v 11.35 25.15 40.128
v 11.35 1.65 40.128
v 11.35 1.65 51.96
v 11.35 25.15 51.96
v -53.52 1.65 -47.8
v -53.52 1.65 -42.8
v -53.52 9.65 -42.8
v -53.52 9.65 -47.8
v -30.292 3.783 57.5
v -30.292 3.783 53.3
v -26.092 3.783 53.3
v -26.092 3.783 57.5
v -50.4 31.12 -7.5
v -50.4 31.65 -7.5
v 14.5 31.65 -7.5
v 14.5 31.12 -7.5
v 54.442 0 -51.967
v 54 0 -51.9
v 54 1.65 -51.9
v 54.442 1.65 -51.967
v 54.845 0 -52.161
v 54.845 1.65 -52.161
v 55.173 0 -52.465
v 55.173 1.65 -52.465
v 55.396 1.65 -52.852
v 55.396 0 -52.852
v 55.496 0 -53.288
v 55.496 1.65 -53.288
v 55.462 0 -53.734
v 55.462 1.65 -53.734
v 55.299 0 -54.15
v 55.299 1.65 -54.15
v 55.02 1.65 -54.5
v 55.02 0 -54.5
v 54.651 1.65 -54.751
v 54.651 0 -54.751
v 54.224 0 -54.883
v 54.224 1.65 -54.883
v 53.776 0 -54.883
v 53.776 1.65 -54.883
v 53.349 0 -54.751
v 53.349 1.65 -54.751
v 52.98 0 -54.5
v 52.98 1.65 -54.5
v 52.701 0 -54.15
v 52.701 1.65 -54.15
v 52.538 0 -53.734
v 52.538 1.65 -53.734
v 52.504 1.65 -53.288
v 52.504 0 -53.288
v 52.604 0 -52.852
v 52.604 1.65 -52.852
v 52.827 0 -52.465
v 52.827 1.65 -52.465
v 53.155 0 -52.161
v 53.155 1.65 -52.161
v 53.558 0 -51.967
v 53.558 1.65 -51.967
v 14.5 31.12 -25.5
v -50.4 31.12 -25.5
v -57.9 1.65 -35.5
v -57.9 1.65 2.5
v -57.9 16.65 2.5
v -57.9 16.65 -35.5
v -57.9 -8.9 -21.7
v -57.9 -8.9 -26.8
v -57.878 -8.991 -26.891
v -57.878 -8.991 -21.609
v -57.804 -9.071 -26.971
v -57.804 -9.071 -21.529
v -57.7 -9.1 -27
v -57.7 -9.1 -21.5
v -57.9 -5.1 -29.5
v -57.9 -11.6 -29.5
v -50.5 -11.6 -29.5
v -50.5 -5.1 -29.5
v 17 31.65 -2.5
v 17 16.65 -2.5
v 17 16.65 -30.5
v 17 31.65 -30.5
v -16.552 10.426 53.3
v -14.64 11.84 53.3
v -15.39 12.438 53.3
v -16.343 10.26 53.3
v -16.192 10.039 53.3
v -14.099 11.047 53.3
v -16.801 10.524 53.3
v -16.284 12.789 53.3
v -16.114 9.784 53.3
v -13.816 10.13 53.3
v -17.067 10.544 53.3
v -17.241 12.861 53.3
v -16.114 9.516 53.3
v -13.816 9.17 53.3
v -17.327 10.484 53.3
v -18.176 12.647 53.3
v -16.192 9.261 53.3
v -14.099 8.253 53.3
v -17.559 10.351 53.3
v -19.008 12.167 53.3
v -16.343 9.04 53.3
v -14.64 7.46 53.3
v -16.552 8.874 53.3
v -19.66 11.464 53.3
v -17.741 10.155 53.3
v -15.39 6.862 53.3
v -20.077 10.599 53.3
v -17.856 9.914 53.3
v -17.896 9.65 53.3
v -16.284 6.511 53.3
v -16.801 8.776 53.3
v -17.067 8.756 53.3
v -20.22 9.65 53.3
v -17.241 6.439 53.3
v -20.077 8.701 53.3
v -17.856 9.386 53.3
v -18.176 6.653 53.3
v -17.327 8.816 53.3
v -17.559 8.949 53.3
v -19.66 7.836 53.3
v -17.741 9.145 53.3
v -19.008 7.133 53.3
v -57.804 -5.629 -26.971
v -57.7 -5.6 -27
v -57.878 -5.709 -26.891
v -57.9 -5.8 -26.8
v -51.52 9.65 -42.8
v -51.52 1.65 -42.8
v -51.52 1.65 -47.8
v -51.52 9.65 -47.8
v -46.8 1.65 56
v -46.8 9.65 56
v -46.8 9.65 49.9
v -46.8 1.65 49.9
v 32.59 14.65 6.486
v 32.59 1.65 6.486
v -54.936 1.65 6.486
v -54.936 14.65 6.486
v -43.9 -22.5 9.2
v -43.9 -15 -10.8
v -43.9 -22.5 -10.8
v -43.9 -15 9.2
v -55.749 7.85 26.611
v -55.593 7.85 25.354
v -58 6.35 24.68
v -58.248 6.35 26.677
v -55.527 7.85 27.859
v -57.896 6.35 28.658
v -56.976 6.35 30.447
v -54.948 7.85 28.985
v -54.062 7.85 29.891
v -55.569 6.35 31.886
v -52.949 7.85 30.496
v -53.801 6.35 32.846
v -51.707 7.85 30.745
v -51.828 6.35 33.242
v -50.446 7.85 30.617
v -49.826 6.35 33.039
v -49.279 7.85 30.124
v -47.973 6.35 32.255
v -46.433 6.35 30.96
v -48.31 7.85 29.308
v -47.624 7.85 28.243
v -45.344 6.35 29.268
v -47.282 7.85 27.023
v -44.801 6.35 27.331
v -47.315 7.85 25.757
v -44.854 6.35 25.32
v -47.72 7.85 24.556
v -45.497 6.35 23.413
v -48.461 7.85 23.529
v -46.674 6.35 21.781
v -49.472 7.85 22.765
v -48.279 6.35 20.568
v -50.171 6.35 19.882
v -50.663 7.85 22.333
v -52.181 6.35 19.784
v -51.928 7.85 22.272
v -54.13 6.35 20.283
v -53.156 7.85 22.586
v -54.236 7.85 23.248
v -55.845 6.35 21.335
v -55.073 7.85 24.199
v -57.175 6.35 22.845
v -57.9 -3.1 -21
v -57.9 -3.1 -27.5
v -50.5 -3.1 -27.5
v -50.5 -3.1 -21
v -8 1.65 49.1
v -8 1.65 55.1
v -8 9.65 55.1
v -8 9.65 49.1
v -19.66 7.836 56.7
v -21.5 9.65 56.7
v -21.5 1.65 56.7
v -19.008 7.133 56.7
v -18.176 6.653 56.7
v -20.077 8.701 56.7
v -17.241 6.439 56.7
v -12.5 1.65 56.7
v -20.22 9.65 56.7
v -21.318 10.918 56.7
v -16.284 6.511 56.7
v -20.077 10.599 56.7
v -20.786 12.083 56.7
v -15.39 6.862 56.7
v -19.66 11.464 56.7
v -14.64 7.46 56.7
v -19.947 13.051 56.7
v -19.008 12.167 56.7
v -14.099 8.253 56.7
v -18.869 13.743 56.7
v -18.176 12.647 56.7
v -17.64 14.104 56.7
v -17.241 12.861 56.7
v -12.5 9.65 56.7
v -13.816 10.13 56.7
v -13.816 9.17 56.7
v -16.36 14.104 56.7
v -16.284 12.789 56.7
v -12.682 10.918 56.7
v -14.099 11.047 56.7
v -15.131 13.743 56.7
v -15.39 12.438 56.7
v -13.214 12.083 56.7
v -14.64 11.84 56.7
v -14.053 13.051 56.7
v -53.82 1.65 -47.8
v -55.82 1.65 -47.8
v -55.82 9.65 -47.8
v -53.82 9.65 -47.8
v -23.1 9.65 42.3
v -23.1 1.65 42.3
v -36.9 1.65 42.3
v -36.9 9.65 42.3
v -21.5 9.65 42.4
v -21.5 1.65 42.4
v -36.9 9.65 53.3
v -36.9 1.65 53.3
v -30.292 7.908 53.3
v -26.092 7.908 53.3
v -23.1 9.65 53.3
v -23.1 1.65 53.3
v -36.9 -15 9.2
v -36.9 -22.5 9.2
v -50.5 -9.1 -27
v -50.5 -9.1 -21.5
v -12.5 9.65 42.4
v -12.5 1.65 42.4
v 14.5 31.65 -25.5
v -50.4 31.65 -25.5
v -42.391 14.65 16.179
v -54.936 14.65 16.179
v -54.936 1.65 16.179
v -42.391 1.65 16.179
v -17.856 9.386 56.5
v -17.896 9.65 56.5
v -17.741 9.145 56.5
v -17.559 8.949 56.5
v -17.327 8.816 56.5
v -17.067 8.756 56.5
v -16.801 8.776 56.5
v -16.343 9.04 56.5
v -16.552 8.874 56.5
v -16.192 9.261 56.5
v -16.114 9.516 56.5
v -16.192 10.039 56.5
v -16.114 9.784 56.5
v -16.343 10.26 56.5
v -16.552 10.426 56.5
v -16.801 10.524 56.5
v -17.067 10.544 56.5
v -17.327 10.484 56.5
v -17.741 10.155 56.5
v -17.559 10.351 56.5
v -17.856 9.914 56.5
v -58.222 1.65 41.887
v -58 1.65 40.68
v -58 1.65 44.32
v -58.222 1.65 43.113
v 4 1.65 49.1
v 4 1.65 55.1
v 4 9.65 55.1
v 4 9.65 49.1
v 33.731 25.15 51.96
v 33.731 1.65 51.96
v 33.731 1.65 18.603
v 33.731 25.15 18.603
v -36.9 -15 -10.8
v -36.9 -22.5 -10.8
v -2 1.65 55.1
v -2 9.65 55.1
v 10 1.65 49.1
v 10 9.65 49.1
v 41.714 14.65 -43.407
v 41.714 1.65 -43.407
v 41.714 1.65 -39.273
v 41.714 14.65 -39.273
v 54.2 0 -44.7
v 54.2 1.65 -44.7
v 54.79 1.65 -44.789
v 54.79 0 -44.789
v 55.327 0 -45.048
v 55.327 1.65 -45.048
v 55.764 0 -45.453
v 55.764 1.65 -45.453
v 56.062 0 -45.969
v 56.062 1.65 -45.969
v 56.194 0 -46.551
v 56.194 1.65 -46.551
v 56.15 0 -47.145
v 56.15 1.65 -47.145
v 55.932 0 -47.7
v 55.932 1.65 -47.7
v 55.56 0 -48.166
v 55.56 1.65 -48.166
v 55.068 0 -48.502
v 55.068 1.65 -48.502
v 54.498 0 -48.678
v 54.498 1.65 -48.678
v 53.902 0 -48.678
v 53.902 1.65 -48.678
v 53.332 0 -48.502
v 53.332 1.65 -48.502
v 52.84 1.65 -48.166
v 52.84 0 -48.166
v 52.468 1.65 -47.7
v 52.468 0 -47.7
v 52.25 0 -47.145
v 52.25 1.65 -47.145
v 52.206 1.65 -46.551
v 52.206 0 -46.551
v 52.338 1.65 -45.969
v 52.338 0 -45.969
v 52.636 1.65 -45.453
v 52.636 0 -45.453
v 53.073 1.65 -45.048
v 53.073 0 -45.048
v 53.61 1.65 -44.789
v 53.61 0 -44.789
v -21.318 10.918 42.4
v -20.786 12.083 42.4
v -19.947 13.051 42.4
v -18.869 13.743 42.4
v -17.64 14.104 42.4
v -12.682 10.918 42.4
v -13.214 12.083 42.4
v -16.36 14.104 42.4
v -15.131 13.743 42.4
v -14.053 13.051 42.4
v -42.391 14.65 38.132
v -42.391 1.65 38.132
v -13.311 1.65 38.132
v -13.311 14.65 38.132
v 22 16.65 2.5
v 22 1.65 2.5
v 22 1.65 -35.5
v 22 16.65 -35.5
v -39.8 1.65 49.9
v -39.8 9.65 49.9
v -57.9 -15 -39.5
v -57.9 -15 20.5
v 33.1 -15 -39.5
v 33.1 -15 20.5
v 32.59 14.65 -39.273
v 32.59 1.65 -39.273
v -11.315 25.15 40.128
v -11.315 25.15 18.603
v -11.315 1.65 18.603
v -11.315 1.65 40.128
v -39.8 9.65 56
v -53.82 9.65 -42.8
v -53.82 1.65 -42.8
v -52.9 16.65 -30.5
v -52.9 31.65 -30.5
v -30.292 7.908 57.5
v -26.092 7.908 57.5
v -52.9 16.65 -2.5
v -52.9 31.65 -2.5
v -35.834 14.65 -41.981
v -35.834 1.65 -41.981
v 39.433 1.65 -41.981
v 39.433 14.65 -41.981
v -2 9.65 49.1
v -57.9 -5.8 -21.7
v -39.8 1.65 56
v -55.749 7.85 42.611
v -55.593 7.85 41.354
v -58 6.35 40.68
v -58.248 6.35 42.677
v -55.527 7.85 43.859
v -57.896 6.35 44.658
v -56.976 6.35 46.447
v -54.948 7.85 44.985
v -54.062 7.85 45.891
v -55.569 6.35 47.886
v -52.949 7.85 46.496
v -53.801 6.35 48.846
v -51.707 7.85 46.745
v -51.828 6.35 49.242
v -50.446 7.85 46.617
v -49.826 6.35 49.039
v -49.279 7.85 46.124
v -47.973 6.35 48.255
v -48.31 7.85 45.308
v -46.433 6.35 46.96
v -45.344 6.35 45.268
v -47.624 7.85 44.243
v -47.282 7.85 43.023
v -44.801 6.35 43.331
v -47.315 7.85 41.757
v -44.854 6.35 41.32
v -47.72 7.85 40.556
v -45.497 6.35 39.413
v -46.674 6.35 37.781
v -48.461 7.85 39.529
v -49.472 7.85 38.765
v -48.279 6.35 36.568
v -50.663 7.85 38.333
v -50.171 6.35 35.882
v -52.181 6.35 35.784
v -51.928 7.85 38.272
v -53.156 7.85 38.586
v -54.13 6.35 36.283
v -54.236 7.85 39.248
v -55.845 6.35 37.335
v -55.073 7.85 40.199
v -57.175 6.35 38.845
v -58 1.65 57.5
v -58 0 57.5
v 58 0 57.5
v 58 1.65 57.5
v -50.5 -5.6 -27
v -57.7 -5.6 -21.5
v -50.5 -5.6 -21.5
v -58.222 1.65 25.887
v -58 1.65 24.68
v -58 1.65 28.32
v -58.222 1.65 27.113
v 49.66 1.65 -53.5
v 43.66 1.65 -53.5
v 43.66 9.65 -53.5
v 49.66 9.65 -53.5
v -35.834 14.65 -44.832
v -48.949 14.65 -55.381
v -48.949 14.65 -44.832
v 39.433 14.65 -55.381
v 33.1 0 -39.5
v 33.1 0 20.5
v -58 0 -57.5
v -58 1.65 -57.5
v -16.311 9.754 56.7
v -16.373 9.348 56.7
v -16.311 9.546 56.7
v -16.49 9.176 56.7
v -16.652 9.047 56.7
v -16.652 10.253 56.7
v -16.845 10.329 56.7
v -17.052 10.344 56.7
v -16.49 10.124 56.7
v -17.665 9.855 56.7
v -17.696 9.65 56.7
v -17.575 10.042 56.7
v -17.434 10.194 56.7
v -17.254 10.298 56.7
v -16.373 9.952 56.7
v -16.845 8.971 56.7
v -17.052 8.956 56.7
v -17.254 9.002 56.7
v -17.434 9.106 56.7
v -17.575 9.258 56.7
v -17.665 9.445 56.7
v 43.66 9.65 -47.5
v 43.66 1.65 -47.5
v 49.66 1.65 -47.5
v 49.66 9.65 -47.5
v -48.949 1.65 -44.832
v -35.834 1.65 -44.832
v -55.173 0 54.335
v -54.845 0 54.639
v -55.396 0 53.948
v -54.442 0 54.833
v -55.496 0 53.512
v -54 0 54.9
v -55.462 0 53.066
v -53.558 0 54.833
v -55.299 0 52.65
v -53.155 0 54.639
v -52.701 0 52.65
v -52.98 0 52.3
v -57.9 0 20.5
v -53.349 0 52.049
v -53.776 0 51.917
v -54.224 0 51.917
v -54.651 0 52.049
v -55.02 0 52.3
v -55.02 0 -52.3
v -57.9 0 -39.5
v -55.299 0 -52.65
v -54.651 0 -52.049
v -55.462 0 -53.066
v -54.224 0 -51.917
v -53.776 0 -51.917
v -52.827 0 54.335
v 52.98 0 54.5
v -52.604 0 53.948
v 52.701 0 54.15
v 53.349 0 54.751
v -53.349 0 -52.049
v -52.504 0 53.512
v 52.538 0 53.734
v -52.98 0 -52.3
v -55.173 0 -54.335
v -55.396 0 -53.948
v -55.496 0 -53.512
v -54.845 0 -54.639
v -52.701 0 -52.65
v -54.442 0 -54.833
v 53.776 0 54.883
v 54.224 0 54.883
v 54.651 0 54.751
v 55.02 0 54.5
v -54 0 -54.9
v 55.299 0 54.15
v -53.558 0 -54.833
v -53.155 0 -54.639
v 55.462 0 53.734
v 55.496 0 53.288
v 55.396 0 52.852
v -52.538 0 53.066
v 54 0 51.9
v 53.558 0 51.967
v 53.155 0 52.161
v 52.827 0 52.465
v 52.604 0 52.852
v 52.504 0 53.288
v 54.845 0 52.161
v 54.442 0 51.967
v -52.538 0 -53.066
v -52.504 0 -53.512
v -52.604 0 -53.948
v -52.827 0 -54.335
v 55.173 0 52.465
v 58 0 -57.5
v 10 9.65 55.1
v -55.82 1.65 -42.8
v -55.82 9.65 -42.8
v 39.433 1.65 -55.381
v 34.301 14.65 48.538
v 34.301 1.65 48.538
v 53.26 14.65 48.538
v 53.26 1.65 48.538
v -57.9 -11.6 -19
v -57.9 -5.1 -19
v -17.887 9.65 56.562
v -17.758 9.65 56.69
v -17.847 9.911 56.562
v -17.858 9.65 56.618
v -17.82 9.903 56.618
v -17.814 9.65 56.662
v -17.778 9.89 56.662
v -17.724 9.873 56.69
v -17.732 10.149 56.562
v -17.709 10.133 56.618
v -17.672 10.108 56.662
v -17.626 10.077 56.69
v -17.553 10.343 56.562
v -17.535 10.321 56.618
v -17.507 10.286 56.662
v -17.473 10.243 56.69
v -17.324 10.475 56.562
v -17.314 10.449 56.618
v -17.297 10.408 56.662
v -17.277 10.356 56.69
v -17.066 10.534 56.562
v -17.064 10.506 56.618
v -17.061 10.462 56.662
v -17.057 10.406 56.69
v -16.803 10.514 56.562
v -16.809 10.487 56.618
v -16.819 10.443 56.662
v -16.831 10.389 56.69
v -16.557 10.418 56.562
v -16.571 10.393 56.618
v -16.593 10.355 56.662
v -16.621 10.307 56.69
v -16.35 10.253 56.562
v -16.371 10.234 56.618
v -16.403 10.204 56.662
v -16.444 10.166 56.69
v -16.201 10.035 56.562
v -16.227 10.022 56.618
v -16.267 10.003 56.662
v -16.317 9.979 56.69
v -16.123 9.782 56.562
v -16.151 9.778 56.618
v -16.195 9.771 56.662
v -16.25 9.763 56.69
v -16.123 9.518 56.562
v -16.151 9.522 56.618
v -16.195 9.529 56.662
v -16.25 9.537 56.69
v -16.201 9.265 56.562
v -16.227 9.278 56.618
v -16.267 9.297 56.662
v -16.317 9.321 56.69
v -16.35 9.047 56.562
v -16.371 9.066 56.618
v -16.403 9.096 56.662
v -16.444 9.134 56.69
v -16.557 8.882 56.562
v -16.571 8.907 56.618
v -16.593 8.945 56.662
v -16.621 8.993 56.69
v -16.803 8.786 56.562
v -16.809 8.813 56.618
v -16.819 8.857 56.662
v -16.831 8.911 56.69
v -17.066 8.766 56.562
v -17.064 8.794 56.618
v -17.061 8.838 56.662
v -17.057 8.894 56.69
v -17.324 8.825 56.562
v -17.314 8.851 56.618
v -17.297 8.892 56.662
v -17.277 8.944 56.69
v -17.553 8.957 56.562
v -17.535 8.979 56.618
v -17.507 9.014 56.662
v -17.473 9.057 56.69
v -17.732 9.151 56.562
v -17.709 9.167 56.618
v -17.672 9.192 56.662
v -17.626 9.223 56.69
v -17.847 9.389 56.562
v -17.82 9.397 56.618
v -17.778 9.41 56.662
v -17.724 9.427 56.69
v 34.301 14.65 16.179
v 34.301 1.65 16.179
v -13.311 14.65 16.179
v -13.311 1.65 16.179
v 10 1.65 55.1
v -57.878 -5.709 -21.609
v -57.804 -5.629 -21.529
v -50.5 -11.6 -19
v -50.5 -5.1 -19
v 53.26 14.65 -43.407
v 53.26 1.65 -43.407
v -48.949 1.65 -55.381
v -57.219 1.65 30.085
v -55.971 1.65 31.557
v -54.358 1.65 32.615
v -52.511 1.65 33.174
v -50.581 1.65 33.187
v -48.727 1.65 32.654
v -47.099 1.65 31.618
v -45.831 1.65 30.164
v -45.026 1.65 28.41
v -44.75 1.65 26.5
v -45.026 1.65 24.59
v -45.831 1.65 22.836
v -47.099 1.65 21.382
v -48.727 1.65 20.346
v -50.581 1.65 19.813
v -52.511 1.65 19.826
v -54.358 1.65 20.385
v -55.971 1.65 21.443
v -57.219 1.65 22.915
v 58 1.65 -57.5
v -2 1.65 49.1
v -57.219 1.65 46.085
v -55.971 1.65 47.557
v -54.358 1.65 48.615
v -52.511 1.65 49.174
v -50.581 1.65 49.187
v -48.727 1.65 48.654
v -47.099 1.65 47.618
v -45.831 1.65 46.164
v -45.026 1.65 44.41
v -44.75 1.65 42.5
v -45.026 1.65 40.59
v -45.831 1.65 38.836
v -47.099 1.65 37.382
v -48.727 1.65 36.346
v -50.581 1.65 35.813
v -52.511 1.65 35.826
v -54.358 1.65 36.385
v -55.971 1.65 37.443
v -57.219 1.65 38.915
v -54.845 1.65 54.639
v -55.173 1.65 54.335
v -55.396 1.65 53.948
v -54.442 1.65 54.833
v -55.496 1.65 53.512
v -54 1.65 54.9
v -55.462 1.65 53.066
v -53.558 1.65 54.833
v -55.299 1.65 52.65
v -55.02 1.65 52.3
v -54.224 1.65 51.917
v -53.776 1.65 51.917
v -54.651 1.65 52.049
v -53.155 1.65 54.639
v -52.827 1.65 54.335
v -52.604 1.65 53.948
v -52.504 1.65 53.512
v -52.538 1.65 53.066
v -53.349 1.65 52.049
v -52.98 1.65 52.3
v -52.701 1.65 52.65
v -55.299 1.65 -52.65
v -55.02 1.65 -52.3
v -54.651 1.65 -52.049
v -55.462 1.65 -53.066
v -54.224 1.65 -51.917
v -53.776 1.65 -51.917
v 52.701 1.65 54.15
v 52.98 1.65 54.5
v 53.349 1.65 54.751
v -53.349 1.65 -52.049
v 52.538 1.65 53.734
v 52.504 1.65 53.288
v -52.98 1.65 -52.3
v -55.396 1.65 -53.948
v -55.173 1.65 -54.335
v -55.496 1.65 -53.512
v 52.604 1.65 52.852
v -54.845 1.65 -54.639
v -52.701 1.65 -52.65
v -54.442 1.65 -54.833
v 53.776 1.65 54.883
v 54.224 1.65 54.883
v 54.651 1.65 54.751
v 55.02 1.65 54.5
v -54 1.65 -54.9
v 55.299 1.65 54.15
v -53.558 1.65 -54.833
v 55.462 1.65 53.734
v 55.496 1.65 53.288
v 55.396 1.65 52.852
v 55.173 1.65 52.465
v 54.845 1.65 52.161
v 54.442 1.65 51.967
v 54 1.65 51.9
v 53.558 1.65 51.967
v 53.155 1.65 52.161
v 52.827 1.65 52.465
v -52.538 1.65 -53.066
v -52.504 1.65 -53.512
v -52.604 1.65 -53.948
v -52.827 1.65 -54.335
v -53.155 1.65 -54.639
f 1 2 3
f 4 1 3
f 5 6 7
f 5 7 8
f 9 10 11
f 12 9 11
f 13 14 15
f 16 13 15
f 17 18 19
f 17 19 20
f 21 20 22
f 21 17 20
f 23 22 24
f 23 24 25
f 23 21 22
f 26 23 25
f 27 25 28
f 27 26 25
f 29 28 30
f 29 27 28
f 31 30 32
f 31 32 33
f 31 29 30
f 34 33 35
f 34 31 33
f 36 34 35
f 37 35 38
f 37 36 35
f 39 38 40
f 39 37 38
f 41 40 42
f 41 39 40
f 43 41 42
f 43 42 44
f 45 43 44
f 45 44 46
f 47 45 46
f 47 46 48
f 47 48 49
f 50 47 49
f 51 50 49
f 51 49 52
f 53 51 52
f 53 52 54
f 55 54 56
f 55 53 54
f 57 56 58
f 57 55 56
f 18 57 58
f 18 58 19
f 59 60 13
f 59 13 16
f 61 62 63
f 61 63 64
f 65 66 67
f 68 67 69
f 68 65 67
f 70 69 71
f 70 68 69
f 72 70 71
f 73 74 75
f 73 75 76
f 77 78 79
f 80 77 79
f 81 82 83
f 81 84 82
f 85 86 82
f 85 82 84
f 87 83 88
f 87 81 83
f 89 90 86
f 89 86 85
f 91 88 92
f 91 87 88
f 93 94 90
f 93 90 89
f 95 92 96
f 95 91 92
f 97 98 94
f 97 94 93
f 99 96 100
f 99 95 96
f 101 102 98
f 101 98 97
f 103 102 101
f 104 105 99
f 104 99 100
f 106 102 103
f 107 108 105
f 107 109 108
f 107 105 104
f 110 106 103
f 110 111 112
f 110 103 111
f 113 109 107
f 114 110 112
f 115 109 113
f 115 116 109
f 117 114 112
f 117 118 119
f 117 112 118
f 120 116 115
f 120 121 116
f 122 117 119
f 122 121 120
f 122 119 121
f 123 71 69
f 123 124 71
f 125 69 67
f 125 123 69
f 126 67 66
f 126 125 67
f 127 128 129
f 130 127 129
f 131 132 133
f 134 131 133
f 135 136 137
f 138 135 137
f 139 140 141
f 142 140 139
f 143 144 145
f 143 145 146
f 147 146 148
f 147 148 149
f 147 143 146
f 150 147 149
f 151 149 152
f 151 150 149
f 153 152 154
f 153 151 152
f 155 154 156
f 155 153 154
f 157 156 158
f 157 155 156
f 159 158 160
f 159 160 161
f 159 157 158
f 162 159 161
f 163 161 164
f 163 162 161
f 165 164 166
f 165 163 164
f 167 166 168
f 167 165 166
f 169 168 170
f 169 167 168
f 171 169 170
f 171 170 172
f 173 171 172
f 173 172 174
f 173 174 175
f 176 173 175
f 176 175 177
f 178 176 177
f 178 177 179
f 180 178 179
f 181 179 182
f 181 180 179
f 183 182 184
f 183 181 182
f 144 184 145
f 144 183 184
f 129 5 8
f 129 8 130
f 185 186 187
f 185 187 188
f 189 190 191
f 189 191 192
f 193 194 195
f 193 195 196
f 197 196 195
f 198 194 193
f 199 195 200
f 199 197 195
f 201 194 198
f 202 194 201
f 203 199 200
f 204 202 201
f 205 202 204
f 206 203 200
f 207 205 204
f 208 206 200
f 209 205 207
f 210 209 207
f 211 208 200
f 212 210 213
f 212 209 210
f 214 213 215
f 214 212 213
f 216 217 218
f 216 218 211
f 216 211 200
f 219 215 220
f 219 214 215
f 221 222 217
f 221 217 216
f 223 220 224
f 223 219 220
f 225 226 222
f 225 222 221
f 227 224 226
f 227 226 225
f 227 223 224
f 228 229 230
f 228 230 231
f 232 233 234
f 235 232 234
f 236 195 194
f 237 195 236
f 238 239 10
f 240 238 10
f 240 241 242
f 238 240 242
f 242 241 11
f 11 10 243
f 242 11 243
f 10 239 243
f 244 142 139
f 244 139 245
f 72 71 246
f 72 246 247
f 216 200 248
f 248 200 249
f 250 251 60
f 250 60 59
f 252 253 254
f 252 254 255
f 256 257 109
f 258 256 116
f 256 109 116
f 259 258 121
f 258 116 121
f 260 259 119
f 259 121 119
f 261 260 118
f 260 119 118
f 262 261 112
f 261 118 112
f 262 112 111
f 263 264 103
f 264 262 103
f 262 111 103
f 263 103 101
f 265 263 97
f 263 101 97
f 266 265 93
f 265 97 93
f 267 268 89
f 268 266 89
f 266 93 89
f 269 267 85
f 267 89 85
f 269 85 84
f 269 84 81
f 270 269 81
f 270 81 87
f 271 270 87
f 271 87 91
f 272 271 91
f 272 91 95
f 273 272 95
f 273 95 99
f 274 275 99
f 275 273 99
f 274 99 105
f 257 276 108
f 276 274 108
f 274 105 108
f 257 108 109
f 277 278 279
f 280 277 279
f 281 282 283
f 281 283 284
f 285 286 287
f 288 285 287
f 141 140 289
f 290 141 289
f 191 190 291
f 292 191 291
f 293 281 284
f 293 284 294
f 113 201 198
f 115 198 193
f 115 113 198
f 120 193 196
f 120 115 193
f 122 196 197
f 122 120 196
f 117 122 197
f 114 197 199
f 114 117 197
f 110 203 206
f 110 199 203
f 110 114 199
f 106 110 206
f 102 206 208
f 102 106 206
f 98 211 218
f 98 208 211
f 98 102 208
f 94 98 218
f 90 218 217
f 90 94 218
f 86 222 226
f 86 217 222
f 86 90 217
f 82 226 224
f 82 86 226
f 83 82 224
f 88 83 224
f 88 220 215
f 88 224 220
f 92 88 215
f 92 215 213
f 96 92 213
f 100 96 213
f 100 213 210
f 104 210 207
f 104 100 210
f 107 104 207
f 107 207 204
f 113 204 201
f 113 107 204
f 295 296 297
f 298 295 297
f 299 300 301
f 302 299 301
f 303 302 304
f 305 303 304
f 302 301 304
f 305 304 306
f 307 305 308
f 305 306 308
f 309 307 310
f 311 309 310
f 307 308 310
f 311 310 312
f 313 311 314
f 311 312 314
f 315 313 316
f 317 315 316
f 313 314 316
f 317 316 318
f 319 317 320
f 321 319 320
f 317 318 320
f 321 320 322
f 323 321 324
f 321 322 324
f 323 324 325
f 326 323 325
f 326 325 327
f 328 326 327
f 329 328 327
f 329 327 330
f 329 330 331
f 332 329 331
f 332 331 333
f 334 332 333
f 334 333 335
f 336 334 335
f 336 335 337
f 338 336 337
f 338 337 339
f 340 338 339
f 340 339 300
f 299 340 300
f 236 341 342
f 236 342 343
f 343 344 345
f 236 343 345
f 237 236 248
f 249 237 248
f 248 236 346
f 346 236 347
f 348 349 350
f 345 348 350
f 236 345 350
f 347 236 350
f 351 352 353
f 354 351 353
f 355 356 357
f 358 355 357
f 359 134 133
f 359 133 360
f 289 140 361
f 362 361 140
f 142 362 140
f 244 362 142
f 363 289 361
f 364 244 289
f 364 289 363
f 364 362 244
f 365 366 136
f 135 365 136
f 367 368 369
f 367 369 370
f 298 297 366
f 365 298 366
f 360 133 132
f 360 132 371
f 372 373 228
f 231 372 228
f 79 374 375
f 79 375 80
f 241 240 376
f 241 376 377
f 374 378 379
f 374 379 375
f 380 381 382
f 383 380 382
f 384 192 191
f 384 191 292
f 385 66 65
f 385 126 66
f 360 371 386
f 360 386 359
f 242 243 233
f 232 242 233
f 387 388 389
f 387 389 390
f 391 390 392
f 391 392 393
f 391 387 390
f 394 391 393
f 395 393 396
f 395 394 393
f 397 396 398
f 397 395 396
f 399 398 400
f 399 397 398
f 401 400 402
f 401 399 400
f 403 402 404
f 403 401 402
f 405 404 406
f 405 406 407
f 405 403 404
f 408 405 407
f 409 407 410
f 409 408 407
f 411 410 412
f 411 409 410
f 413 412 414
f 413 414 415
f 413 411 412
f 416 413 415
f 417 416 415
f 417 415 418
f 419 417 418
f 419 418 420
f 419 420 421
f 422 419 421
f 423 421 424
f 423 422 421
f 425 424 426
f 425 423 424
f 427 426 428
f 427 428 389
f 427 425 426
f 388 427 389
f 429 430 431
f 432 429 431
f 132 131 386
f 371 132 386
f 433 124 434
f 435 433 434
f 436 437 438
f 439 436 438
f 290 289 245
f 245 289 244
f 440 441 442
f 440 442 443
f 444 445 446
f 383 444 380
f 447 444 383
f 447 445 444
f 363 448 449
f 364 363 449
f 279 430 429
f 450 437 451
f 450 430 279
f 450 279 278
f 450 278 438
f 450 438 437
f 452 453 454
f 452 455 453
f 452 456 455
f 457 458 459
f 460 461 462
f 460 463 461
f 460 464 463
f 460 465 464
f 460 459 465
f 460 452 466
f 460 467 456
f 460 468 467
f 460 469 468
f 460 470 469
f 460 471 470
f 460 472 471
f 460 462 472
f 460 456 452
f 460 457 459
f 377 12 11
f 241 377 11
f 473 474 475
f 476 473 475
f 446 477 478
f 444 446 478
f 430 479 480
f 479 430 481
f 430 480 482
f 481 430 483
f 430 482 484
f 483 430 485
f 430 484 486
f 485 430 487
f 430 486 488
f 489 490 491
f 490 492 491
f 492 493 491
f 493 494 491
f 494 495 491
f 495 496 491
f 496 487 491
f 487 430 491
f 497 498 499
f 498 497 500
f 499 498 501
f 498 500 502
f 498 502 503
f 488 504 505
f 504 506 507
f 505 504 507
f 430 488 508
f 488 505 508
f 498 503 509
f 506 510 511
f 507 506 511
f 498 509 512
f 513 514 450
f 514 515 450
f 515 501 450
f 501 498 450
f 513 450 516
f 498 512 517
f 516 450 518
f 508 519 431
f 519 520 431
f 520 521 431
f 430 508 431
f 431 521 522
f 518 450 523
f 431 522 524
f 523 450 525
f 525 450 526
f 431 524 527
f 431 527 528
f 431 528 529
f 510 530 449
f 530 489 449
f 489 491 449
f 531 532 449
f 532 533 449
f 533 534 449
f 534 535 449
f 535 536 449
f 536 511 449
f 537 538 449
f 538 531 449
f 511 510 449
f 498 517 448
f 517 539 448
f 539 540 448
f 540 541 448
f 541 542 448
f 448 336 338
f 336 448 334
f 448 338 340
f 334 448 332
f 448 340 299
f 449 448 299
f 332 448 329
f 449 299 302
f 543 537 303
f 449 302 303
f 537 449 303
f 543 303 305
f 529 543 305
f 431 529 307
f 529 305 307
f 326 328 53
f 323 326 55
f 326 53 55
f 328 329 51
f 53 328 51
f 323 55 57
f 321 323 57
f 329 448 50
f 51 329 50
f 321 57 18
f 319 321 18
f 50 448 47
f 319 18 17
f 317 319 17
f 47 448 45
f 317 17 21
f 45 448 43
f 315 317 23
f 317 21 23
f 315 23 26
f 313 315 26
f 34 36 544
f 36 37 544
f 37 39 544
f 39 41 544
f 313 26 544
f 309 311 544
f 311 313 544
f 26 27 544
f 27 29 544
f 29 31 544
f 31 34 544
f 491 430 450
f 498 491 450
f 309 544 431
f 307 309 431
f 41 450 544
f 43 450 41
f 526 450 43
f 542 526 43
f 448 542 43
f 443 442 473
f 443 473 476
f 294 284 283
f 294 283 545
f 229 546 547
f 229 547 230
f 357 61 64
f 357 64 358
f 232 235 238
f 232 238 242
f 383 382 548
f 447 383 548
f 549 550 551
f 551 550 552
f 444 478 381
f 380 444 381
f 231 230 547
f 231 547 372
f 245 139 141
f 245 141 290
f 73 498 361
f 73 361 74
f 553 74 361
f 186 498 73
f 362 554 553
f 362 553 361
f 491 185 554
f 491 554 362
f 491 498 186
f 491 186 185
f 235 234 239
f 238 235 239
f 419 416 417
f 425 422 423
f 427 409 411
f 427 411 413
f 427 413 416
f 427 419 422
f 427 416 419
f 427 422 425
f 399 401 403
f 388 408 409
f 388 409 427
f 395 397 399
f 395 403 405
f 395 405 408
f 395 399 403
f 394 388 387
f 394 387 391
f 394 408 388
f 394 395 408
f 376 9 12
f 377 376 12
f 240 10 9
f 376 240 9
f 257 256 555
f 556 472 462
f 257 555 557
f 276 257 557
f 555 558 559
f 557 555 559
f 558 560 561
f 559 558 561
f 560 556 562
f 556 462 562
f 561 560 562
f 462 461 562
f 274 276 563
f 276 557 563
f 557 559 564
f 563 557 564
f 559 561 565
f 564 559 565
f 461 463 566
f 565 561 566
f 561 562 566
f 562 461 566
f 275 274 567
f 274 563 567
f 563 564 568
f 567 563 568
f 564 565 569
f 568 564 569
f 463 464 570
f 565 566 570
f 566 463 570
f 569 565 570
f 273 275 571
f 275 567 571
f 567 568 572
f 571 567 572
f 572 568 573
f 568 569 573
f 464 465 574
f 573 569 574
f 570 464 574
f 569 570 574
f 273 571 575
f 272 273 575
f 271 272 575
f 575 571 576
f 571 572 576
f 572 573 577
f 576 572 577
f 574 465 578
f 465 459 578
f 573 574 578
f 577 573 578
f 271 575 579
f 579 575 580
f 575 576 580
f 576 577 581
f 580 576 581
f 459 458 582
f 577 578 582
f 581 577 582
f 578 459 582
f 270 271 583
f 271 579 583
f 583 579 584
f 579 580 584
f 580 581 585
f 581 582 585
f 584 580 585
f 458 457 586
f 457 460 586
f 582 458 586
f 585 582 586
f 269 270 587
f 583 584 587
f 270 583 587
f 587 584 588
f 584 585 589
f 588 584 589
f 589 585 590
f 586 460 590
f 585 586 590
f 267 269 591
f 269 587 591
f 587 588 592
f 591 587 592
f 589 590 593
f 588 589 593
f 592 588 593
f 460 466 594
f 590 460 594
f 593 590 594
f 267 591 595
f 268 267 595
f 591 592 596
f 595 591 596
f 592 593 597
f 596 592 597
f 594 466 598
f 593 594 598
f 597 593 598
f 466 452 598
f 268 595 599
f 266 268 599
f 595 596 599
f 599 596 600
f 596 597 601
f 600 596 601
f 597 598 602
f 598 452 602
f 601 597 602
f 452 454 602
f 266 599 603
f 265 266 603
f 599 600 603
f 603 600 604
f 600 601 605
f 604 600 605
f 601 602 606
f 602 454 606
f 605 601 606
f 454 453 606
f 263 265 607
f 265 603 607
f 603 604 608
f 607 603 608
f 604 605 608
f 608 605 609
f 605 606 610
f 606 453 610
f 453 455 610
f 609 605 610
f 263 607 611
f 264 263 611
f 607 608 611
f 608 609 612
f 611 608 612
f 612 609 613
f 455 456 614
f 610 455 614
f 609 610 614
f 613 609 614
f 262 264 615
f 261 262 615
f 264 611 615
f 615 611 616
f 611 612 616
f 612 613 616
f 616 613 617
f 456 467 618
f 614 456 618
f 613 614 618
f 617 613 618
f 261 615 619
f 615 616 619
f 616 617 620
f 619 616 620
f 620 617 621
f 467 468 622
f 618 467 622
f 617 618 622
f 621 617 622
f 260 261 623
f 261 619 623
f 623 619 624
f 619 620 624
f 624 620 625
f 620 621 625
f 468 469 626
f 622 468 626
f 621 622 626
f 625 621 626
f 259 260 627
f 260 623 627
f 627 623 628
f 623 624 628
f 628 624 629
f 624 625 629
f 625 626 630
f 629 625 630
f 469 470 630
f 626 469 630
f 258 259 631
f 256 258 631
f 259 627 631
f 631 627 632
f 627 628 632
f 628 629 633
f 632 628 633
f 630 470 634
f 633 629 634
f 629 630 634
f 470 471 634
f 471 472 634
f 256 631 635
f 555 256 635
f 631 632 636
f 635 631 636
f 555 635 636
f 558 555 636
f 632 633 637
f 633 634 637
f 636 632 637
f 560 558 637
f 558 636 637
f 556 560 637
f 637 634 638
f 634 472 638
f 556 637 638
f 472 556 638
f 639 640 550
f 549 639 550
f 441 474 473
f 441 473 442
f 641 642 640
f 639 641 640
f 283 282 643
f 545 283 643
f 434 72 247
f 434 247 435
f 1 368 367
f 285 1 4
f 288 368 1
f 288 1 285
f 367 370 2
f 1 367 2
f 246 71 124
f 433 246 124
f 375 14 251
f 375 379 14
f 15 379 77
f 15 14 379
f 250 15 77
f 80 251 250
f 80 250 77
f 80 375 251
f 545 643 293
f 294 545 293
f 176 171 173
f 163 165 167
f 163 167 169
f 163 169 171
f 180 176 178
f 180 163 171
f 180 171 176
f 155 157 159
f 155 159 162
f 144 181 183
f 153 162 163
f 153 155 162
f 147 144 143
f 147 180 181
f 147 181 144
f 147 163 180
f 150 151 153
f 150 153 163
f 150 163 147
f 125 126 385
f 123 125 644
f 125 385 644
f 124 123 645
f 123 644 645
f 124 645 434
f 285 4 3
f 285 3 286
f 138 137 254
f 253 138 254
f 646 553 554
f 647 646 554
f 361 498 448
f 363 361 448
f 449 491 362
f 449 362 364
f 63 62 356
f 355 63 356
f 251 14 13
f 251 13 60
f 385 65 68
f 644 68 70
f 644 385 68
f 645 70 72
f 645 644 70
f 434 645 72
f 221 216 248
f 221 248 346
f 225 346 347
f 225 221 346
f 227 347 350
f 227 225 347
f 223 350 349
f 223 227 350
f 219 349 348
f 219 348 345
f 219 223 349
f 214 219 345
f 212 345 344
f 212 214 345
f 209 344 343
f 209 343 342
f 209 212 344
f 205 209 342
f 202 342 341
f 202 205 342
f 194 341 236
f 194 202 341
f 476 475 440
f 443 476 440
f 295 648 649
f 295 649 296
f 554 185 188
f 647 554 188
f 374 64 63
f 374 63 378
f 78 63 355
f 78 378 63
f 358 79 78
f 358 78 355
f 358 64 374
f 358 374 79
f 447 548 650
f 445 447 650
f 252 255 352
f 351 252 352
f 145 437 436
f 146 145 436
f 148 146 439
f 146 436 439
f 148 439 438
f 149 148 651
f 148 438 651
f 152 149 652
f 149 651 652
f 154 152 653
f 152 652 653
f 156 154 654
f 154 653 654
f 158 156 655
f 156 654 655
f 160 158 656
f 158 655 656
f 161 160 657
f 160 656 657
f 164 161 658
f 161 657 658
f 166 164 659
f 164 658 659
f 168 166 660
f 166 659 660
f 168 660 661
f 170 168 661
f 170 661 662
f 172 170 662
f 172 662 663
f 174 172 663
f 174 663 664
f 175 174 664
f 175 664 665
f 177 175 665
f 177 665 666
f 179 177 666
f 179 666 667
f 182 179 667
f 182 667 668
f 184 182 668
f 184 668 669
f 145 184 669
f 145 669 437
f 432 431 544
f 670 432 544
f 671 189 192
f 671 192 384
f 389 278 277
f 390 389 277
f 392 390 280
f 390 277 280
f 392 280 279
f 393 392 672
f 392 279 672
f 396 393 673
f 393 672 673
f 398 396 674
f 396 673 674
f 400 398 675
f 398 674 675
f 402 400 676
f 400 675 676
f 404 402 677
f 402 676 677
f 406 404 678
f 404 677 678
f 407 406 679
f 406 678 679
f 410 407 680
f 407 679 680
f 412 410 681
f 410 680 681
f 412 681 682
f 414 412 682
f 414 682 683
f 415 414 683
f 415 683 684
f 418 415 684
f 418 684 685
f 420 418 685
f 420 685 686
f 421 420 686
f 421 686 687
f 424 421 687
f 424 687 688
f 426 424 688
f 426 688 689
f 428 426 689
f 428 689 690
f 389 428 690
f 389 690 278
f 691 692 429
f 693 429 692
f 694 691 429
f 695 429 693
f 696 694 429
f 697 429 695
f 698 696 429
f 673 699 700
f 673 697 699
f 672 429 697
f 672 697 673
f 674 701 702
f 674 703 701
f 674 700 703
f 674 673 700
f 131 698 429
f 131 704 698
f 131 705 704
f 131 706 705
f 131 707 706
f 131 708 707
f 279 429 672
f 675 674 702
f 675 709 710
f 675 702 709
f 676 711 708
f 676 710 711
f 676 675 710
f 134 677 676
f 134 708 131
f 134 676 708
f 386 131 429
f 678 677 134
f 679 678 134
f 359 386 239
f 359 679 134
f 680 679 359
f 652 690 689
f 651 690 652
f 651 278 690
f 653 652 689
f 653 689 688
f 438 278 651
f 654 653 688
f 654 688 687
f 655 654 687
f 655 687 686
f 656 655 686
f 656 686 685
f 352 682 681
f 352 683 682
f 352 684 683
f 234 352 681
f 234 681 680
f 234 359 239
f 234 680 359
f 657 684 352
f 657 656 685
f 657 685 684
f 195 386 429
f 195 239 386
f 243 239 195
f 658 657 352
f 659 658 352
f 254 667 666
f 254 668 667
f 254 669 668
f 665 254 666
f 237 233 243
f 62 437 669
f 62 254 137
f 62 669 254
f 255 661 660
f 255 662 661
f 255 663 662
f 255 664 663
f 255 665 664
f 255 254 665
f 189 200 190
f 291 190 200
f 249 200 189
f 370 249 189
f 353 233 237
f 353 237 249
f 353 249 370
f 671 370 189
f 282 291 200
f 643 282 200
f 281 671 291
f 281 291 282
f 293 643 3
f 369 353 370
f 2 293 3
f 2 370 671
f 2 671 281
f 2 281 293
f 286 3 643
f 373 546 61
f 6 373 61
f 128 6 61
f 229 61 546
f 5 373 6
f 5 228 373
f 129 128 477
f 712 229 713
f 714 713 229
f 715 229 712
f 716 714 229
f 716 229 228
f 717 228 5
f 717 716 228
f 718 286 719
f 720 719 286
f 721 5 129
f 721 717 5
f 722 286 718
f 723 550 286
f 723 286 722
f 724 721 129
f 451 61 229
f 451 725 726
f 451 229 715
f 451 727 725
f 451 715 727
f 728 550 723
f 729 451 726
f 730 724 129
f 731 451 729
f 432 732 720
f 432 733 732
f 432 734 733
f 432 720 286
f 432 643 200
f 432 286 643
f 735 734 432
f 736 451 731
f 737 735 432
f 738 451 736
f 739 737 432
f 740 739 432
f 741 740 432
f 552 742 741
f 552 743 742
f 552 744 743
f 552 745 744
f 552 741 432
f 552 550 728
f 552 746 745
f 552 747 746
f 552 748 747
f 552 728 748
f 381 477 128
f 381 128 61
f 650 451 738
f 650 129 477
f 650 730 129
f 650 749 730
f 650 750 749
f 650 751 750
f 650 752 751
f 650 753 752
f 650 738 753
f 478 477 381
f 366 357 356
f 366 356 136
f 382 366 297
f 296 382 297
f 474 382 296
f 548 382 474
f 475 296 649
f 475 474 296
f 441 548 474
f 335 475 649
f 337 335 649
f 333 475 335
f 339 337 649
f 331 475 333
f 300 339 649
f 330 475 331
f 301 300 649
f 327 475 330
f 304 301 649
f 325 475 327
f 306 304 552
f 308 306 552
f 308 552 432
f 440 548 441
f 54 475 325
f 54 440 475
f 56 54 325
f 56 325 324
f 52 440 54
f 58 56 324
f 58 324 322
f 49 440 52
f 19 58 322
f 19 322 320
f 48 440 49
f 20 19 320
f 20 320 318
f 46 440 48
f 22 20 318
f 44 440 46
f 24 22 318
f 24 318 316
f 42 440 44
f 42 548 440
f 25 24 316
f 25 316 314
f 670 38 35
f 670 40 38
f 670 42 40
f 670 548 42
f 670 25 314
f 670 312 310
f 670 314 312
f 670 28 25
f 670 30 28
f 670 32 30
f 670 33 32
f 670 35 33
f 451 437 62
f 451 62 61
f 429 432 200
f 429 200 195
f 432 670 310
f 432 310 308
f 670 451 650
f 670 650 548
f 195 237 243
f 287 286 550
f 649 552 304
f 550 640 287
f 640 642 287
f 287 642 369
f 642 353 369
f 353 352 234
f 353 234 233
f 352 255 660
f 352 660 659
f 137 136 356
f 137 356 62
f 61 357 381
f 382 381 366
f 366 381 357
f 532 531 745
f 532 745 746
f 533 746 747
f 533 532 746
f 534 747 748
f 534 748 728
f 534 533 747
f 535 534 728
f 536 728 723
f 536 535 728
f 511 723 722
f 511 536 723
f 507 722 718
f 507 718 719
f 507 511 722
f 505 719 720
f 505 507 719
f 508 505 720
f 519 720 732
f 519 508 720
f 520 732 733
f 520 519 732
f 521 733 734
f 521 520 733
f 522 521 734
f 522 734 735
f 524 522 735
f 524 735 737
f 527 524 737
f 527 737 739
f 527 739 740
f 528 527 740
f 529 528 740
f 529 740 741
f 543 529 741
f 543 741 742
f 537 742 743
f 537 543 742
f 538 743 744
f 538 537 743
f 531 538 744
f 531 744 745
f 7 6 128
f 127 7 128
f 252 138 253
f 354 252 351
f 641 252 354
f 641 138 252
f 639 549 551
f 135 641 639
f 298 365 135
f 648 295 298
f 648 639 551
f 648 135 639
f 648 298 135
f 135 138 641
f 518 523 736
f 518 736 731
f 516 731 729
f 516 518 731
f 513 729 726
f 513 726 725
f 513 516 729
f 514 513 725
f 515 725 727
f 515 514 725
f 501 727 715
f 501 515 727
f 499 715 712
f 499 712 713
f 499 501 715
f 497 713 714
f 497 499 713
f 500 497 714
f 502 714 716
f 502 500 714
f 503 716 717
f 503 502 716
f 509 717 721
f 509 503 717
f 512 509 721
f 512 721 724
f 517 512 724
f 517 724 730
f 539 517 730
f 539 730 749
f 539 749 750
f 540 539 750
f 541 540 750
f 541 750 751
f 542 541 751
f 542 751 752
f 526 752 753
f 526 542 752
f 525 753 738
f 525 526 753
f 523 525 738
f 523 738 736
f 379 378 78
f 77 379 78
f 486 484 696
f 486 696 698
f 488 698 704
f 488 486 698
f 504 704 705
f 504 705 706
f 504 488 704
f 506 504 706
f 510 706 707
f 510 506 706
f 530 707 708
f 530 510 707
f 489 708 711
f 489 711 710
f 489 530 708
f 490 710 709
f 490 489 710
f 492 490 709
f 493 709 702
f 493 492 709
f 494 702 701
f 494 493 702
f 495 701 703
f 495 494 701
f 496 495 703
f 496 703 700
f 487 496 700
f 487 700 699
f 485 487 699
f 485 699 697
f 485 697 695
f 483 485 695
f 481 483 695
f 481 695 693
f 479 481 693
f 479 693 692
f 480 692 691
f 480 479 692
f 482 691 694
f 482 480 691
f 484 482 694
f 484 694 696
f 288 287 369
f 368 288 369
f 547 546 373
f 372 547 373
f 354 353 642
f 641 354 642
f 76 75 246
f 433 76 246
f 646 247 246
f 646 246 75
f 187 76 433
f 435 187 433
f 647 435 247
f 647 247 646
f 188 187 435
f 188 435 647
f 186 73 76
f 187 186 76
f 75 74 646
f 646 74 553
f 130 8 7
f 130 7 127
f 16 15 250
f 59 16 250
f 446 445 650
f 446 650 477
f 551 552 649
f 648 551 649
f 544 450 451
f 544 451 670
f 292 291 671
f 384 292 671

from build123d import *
from OCP.BRepFilletAPI import BRepFilletAPI_MakeChamfer

# Parameters (mm, degrees)
SKETCH1_W              = 116
SKETCH1_H              = 115
SKETCH1_R              = 1.5
BASE_FLANGE1_DEPTH     = 1.65
SKETCH3_W              = 79.9
SKETCH3_H              = 38
EXTRUDE1_DEPTH         = 15
SKETCH4_W              = 69.9
SKETCH4_H              = 28
EXTRUDE2_DEPTH         = 15
SKETCH6_W              = 64.9
SKETCH6_H              = 18
DISPLAY_DEPTH          = 0.53
SKETCH7_W              = 91
SKETCH7_H              = 60
WIRING_BOARD_DEPTH     = 15
SKETCH8_W              = 7
SKETCH8_H              = 20
EXTRUDE5_DEPTH         = 7.5
SKETCH9_W              = 10.5
SKETCH9_H              = 8.5
SKETCH9_W_2            = 5.5
SKETCH9_H_2            = 3.5
USB_DEPTH              = 7.5
CHAMFER1_SIZE          = 2
SKETCH10_R             = 6.75
POTENTIOMETERS_DEPTH   = 6.2
SKETCH11_W             = 7
SKETCH11_H             = 6.1
SKETCH11_W_2           = 9
SKETCH11_H_2           = 14.3
SKETCH11_W_3           = 6
SKETCH11_H_3           = 6
SKETCH11_W_4           = 2
SKETCH11_H_4           = 5
KEEP_ACCESSIBLE_DEPTH  = 8
EXTRUDE9_DEPTH         = 13
HOT_VOLTAGE_REGS_DEPTH = 23.5
SKETCH14_R             = 4.5
EXTRUDE10_DEPTH        = 14.3
EXTRUDE11_DEPTH        = 10
EXTRUDE11_DEPTH_BACK   = 3.4
SKETCH15_R             = 3.219788924
SKETCH15_R_2           = 0.896300673
SKETCH15_W             = 5.949829442
SKETCH15_H             = 2.638553101
SKETCH15_H_2           = 2.133019186
FILLET1_R              = 0.2
CHAMFER2_SIZE          = 1.5
CHAMFER2_SIZE2         = 2.5
SKETCH16_R             = 2
EXTRUDE12_DEPTH        = 10


# Sheet-metal steps are written as plain solids
with BuildPart() as part:
    # Sketch1 → Base-Flange1 (new body)
    with BuildSketch(Plane(origin=(0, 0, 0), x_dir=(1, 0, 0), z_dir=(0, 1, 0))):
        Rectangle(SKETCH1_W, SKETCH1_H)
        with Locations(Location((54, 53.4, 0), (0, 0, 270))):
            Circle(SKETCH1_R, mode=Mode.SUBTRACT)
        with Locations(Location((54, -53.4, 0), (0, 0, 90))):
            Circle(SKETCH1_R, mode=Mode.SUBTRACT)
        with Locations(Location((-54, 53.4, 0), (0, 0, 90))):
            Circle(SKETCH1_R, mode=Mode.SUBTRACT)
        with Locations(Location((-54, -53.4, 0), (0, 0, 270))):
            Circle(SKETCH1_R, mode=Mode.SUBTRACT)
    extrude(amount=BASE_FLANGE1_DEPTH)

    # Sketch3 → Extrude1 (add)
    with BuildSketch(Plane(origin=(0, 1.65, 0), x_dir=(1, 0, 0), z_dir=(0, 1, 0))):
        with Locations((-17.95, 16.5)):
            Rectangle(SKETCH3_W, SKETCH3_H)
    extrude(amount=EXTRUDE1_DEPTH)

    # Sketch4 → Extrude2 (add)
    with BuildSketch(Plane(origin=(0, 16.65, 0), x_dir=(1, 0, 0), z_dir=(0, 1, 0))):
        with Locations((-17.95, 16.5)):
            Rectangle(SKETCH4_W, SKETCH4_H)
    extrude(amount=EXTRUDE2_DEPTH)

    # Sketch6 → Display! (cut)
    with BuildSketch(Plane(origin=(0, 31.65, 0), x_dir=(1, 0, 0), z_dir=(0, 1, 0))):
        with Locations((-17.95, 16.5)):
            Rectangle(SKETCH6_W, SKETCH6_H)
    extrude(amount=-DISPLAY_DEPTH, mode=Mode.SUBTRACT)

    # Sketch7 → Wiring Board (add)
    with BuildSketch(Plane.XZ):
        with Locations((-12.4, -9.5)):
            Rectangle(SKETCH7_W, SKETCH7_H)
    extrude(amount=WIRING_BOARD_DEPTH)

    # Sketch8 → Extrude5 (add)
    with BuildSketch(Plane.XZ.offset(15)):
        with Locations((-40.4, -0.8)):
            Rectangle(SKETCH8_W, SKETCH8_H)
    extrude(amount=EXTRUDE5_DEPTH)

    # Sketch9 → USB (cut)
    with BuildSketch(Plane.ZY.offset(58)):
        with Locations((-24.25, -7.35)):
            Rectangle(SKETCH9_W, SKETCH9_H)
        with Locations((-24.25, -7.35)):
            Rectangle(SKETCH9_W_2, SKETCH9_H_2, mode=Mode.SUBTRACT)
    extrude(amount=-USB_DEPTH, mode=Mode.SUBTRACT)

    # Chamfer1
    chamfer1_edges = [part.edges().sort_by_distance(p)[0] for p in [
        (-54.2, -3.1, -19),
        (-54.2, -3.1, -29.5),
    ]]
    chamfer(chamfer1_edges, length=CHAMFER1_SIZE)

    # Sketch10 → Potentiometers (add)
    with BuildSketch(Plane(origin=(0, 1.65, 0), x_dir=(1, 0, 0), z_dir=(0, 1, 0))):
        with Locations(Location((-51.5, -26.5, 0), (0, 0, 164.357528987))):
            Circle(SKETCH10_R)
        with Locations(Location((-51.5, -42.5, 0), (0, 0, 164.357528987))):
            Circle(SKETCH10_R)
    extrude(amount=POTENTIOMETERS_DEPTH)

    # Sketch11 → Keep Accessible!! (add)
    with BuildSketch(Plane(origin=(0, 1.65, 0), x_dir=(1, 0, 0), z_dir=(0, 1, 0))):
        Polygon((-26.092034571, -53.3), (-23.1, -53.3), (-23.1, -42.3), (-36.9, -42.3), (-36.9, -53.3), (-30.292034571, -53.3), (-30.292034571, -57.5), (-26.092034571, -57.5), align=None)
        with Locations((-43.3, -52.95)):
            Rectangle(SKETCH11_W, SKETCH11_H)
        with Locations((-17, -49.55)):
            Rectangle(SKETCH11_W_2, SKETCH11_H_2)
        with Locations((-5, -52.1)):
            Rectangle(SKETCH11_W_3, SKETCH11_H_3)
        with Locations((7, -52.1)):
            Rectangle(SKETCH11_W_3, SKETCH11_H_3)
        with Locations((46.66, 50.5)):
            Rectangle(SKETCH11_W_3, SKETCH11_H_3)
        with Locations((-54.82, 45.3)):
            Rectangle(SKETCH11_W_4, SKETCH11_H_4)
        with Locations((-52.52, 45.3)):
            Rectangle(SKETCH11_W_4, SKETCH11_H_4)
    extrude(amount=KEEP_ACCESSIBLE_DEPTH)

    # Sketch12 → Extrude9 (add)
    with BuildSketch(Plane(origin=(0, 1.65, 0), x_dir=(1, 0, 0), z_dir=(0, 1, 0))):
        Polygon((-48.948570669, 53.670290093), (-48.948570669, 44.832154672), (-35.833918109, 44.832154672), (-35.833918109, 41.981143246), (37.294524965, 41.981143246), (39.432783534, 41.981143246), (39.432783534, 53.670290093), (39.432783534, 55.380896948), (-48.948570669, 55.380896948), align=None)
        Polygon((41.713592675, 43.406648959), (41.713592675, 39.272682392), (32.590356112, 39.272682392), (32.590356112, -6.486050994), (-54.935694663, -6.486050994), (-54.935694663, -16.179489842), (-42.391244389, -16.179489842), (-42.391244389, -38.132277821), (-13.310927845, -38.132277821), (-13.310927845, -16.179489842), (34.300962968, -16.179489842), (34.300962968, -48.538469526), (53.26018895, -48.538469526), (53.26018895, 43.406648959), align=None)
    extrude(amount=EXTRUDE9_DEPTH)

    # Sketch13 → Hot! Voltage Regs (add)
    with BuildSketch(Plane(origin=(0, 1.65, 0), x_dir=(1, 0, 0), z_dir=(0, 1, 0))):
        Polygon((-11.315219847, -18.602849554), (-11.315219847, -40.12798582), (11.350320989, -40.12798582), (11.350320989, -51.959683237), (33.730760683, -51.959683237), (33.730760683, -18.602849554), align=None)
    extrude(amount=HOT_VOLTAGE_REGS_DEPTH)

    # Sketch14 → Extrude10 (add)
    with BuildSketch(Plane.XY.offset(56.7)):
        with Locations((-17, 9.65)):
            Circle(SKETCH14_R)
    extrude(amount=-EXTRUDE10_DEPTH)

    # Sketch15 → Extrude11 (cut, two sides: drawn at the far end of the back side and taken through both)
    # profile 1 of 3: a face of its own
    with BuildSketch(Plane.XY.offset(56.7).offset(-EXTRUDE11_DEPTH_BACK)):
        with Locations(Location((-17, 9.65, 0), (0, 0, 180))):
            Circle(SKETCH15_R)
        with Locations(Location((-17, 9.65, 0), (0, 0, 180))):
            Circle(SKETCH15_R_2, mode=Mode.SUBTRACT)
    # profile 2 of 3: a face of its own
    with BuildSketch(Plane.XY.offset(56.7).offset(-EXTRUDE11_DEPTH_BACK)):
        with Locations((-28.188847243, 9.227024123)):
            Rectangle(SKETCH15_W, SKETCH15_H)
    # profile 3 of 3: a face of its own
    with BuildSketch(Plane.XY.offset(56.7).offset(-EXTRUDE11_DEPTH_BACK)):
        with Locations((-28.188847243, 2.716509593)):
            Rectangle(SKETCH15_W, SKETCH15_H_2)
    extrude(amount=EXTRUDE11_DEPTH + EXTRUDE11_DEPTH_BACK, mode=Mode.SUBTRACT)

    # Fillet1
    fillet1_edges = [part.edges().sort_by_distance(p)[0] for p in [
        (-16.103699327, 9.65, 56.7),
        (-57.9, -9.1, -24.25),
        (-57.9, -7.35, -21.5),
        (-57.9, -5.6, -24.25),
        (-57.9, -7.35, -27),
    ]]
    fillet(fillet1_edges, radius=FILLET1_R)

    # Chamfer2: one chamfer whose edges measure the first distance from different faces: ONE call of the kernel's chamfer builder (chamfer() names one face for all edges)
    chamfer2_edges_1 = [part.edges().sort_by_distance(p)[0] for p in [
        (-45, 7.85, 28.320027472),
    ]]
    chamfer2_side_1 = [part.faces().sort_by_distance(p)[0] for p in [
        (-45, 4.75, 28.320027472),
    ]]
    chamfer2_edges_2 = [part.edges().sort_by_distance(p)[0] for p in [
        (-45, 7.85, 44.320027472),
    ]]
    chamfer2_side_2 = [part.faces().sort_by_distance(p)[0] for p in [
        (-45, 4.75, 44.320027472),
    ]]
    chamfer2 = BRepFilletAPI_MakeChamfer(part.part.solid().wrapped)
    for e in chamfer2_edges_1:
        chamfer2.Add(CHAMFER2_SIZE, CHAMFER2_SIZE2, e.wrapped, chamfer2_side_1[0].wrapped)  # the first distance lies on this face
    for e in chamfer2_edges_2:
        chamfer2.Add(CHAMFER2_SIZE, CHAMFER2_SIZE2, e.wrapped, chamfer2_side_2[0].wrapped)  # the first distance lies on this face
    add(Compound.cast(chamfer2.Shape()), mode=Mode.REPLACE)

    # Sketch16 → Extrude12 (cut)
    with BuildSketch(Plane(origin=(0, 1.65, 0), x_dir=(1, 0, 0), z_dir=(0, 1, 0))):
        with Locations(Location((54.2, 46.7, 0), (0, 0, 270))):
            Circle(SKETCH16_R)
    extrude(amount=-EXTRUDE12_DEPTH, mode=Mode.SUBTRACT)


solid = part.part
